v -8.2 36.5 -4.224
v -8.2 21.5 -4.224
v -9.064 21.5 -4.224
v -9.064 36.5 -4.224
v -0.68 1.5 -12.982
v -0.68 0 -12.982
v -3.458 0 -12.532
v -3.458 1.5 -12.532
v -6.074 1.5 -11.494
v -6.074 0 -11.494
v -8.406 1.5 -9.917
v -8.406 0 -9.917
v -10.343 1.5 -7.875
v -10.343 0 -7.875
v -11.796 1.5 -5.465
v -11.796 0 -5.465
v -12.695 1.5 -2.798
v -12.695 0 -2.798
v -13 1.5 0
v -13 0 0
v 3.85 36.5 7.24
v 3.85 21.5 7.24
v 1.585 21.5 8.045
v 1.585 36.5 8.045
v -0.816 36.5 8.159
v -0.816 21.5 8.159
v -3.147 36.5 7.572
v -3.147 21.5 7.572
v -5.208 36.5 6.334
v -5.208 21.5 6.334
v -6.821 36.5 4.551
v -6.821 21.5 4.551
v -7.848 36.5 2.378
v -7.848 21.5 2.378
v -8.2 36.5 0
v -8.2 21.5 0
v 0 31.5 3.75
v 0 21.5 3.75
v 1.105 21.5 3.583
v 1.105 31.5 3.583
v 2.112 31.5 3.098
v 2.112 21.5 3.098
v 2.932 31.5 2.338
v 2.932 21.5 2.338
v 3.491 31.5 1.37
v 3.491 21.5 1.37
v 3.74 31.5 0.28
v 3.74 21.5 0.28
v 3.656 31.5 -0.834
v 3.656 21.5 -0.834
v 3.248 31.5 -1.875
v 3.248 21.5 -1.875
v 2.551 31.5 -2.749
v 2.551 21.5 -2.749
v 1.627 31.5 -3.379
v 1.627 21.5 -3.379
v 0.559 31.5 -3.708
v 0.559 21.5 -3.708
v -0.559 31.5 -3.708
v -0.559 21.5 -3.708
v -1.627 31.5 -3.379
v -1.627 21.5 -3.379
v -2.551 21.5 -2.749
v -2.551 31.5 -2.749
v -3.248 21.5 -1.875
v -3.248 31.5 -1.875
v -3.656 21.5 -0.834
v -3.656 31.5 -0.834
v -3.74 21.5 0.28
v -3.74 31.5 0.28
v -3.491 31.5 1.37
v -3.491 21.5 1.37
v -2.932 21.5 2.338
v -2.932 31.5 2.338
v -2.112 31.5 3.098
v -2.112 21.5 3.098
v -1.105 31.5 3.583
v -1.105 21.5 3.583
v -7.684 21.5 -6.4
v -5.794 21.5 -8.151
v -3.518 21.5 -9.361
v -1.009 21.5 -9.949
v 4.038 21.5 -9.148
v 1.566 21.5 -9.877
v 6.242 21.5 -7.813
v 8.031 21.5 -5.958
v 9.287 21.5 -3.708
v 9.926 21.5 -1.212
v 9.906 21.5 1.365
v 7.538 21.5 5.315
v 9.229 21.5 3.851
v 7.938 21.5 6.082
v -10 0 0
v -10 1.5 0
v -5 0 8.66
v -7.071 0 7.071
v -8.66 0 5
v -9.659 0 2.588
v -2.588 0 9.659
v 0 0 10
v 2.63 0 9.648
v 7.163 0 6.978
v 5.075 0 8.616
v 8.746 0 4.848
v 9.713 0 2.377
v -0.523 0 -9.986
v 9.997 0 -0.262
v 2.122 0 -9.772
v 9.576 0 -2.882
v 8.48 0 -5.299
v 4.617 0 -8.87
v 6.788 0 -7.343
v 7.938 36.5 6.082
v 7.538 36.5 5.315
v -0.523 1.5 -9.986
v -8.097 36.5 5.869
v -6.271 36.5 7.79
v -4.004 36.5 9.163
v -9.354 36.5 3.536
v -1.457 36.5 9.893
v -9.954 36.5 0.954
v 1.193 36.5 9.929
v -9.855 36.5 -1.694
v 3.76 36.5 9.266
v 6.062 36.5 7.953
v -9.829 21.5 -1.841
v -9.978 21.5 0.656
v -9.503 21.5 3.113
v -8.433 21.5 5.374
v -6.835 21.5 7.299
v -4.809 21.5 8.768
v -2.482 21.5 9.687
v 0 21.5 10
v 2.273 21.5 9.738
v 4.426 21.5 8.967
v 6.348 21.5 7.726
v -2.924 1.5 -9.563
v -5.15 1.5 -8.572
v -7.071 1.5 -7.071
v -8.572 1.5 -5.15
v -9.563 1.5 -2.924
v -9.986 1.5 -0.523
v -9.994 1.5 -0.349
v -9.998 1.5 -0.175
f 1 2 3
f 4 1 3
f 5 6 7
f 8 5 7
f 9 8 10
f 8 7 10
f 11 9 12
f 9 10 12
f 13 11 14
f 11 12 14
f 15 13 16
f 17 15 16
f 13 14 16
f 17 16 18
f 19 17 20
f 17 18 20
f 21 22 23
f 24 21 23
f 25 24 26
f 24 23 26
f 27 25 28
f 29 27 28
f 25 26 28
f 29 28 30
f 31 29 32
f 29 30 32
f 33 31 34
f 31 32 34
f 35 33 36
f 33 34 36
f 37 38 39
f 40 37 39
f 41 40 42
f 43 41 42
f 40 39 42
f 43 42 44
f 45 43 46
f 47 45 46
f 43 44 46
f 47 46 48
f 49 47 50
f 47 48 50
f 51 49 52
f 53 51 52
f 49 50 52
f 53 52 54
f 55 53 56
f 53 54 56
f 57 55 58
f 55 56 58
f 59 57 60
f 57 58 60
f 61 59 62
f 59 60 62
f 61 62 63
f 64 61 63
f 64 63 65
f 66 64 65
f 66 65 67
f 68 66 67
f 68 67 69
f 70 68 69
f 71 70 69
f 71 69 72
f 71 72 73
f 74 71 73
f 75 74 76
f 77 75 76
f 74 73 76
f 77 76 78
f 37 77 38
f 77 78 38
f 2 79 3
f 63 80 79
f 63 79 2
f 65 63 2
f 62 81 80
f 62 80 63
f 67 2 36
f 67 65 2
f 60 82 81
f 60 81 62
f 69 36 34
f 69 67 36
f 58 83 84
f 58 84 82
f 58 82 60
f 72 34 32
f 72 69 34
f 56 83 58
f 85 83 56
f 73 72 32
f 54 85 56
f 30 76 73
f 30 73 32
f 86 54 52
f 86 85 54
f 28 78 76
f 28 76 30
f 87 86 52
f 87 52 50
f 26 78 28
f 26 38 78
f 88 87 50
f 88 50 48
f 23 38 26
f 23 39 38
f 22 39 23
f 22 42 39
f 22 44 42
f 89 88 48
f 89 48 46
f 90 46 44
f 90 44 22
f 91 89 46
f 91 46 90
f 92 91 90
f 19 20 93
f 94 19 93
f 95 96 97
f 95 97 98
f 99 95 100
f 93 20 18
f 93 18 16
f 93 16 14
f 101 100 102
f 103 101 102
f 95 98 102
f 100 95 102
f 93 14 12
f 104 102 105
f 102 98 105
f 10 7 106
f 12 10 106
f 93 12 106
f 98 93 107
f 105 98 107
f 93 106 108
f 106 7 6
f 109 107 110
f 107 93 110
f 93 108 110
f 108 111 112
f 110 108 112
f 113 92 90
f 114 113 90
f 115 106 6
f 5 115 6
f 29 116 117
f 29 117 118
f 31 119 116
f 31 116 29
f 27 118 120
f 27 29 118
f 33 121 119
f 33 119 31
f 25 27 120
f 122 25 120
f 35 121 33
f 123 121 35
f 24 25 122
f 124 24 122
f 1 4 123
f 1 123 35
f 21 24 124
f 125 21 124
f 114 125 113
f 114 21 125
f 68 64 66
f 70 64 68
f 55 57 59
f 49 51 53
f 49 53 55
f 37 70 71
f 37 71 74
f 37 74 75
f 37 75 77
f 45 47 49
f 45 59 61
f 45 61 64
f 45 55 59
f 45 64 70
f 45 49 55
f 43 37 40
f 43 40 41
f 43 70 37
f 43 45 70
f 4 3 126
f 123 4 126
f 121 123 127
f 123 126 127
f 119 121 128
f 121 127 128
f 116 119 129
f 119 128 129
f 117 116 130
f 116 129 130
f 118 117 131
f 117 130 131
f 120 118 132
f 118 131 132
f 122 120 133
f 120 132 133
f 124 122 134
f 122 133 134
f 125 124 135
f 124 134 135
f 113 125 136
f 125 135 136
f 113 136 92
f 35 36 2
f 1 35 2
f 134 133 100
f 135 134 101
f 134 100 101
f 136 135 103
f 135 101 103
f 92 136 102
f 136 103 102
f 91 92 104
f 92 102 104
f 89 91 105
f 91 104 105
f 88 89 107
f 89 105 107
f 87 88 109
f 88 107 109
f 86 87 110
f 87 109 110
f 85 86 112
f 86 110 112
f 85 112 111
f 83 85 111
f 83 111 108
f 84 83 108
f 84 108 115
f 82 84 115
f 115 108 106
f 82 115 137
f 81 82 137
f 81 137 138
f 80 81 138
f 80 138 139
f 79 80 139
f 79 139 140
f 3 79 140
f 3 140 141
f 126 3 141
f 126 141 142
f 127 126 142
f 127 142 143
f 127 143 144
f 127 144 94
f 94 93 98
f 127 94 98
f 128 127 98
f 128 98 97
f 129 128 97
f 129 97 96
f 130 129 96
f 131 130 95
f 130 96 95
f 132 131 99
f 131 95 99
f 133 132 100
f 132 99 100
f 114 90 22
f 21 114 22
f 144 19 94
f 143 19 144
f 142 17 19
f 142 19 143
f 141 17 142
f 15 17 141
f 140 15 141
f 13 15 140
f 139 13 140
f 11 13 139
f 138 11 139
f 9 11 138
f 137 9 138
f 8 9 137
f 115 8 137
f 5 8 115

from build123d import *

# Parameters (mm, degrees)
SKETCH1_R           = 10
SKETCH1_R_2         = 8.018181818
BOSS_EXTRUDE1_DEPTH = 21.5
BOSS_EXTRUDE2_DEPTH = 15
SKETCH3_R           = 3.75
BOSS_EXTRUDE3_DEPTH = 10
BOSS_EXTRUDE4_DEPTH = 1.5


with BuildPart() as part:
    # Sketch1 → Boss-Extrude1 (new body)
    # profile 1 of 2: a face of its own
    with BuildSketch(Plane(origin=(0, 0, 0), x_dir=(1, 0, 0), z_dir=(0, 1, 0))):
        with Locations(Location((0, 0, 0), (0, 0, 270))):
            Circle(SKETCH1_R)
        Circle(SKETCH1_R_2, mode=Mode.SUBTRACT)
    # profile 2 of 2: a face of its own
    with BuildSketch(Plane(origin=(0, 0, 0), x_dir=(1, 0, 0), z_dir=(0, 1, 0))):
        Circle(SKETCH1_R_2)
    extrude(amount=BOSS_EXTRUDE1_DEPTH)

    # Sketch2 → Boss-Extrude2 (add)
    with BuildSketch(Plane(origin=(0, 21.5, 0), x_dir=(1, 0, 0), z_dir=(0, 1, 0))):
        with BuildLine():
            ThreePointArc((3.849666815, -7.240170261), (-4.223312214, -7.028771866), (-8.2, 0))
            Line((-8.2, 0), (-8.2, 4.223635209))
            Line((-8.2, 4.223635209), (-9.064265311, 4.223635209))
            ThreePointArc((-9.064265311, 4.223635209), (-5.183292284, -8.551811568), (7.938142814, -6.081602475))
            Line((7.938142814, -6.081602475), (7.538265506, -5.315317068))
            Line((7.538265506, -5.315317068), (3.849666815, -7.240170261))
        make_face()
    extrude(amount=BOSS_EXTRUDE2_DEPTH)

    # Sketch3 → Boss-Extrude3 (add)
    with BuildSketch(Plane(origin=(0, 21.5, 0), x_dir=(1, 0, 0), z_dir=(0, 1, 0))):
        with Locations(Location((0, 0, 0), (0, 0, 270))):
            Circle(SKETCH3_R)
    extrude(amount=BOSS_EXTRUDE3_DEPTH)

    # Sketch4 → Boss-Extrude4 (add)
    with BuildSketch(Plane(origin=(0, 0, 0), x_dir=(1, 0, 0), z_dir=(0, 1, 0))):
        with BuildLine():
            ThreePointArc((-0.680367431, 12.982183952), (-9.429866823, 8.948609484), (-13, 0))
            Line((-13, 0), (-10, 0))
            ThreePointArc((-10, 0), (-9.99657325, 0.261769483), (-9.986295348, 0.523359562))
            ThreePointArc((-9.986295348, 0.523359562), (-7.071067812, 7.071067812), (-0.523359562, 9.986295348))
            Line((-0.523359562, 9.986295348), (-0.680367431, 12.982183952))
        make_face()
    extrude(amount=BOSS_EXTRUDE4_DEPTH)


solid = part.part
